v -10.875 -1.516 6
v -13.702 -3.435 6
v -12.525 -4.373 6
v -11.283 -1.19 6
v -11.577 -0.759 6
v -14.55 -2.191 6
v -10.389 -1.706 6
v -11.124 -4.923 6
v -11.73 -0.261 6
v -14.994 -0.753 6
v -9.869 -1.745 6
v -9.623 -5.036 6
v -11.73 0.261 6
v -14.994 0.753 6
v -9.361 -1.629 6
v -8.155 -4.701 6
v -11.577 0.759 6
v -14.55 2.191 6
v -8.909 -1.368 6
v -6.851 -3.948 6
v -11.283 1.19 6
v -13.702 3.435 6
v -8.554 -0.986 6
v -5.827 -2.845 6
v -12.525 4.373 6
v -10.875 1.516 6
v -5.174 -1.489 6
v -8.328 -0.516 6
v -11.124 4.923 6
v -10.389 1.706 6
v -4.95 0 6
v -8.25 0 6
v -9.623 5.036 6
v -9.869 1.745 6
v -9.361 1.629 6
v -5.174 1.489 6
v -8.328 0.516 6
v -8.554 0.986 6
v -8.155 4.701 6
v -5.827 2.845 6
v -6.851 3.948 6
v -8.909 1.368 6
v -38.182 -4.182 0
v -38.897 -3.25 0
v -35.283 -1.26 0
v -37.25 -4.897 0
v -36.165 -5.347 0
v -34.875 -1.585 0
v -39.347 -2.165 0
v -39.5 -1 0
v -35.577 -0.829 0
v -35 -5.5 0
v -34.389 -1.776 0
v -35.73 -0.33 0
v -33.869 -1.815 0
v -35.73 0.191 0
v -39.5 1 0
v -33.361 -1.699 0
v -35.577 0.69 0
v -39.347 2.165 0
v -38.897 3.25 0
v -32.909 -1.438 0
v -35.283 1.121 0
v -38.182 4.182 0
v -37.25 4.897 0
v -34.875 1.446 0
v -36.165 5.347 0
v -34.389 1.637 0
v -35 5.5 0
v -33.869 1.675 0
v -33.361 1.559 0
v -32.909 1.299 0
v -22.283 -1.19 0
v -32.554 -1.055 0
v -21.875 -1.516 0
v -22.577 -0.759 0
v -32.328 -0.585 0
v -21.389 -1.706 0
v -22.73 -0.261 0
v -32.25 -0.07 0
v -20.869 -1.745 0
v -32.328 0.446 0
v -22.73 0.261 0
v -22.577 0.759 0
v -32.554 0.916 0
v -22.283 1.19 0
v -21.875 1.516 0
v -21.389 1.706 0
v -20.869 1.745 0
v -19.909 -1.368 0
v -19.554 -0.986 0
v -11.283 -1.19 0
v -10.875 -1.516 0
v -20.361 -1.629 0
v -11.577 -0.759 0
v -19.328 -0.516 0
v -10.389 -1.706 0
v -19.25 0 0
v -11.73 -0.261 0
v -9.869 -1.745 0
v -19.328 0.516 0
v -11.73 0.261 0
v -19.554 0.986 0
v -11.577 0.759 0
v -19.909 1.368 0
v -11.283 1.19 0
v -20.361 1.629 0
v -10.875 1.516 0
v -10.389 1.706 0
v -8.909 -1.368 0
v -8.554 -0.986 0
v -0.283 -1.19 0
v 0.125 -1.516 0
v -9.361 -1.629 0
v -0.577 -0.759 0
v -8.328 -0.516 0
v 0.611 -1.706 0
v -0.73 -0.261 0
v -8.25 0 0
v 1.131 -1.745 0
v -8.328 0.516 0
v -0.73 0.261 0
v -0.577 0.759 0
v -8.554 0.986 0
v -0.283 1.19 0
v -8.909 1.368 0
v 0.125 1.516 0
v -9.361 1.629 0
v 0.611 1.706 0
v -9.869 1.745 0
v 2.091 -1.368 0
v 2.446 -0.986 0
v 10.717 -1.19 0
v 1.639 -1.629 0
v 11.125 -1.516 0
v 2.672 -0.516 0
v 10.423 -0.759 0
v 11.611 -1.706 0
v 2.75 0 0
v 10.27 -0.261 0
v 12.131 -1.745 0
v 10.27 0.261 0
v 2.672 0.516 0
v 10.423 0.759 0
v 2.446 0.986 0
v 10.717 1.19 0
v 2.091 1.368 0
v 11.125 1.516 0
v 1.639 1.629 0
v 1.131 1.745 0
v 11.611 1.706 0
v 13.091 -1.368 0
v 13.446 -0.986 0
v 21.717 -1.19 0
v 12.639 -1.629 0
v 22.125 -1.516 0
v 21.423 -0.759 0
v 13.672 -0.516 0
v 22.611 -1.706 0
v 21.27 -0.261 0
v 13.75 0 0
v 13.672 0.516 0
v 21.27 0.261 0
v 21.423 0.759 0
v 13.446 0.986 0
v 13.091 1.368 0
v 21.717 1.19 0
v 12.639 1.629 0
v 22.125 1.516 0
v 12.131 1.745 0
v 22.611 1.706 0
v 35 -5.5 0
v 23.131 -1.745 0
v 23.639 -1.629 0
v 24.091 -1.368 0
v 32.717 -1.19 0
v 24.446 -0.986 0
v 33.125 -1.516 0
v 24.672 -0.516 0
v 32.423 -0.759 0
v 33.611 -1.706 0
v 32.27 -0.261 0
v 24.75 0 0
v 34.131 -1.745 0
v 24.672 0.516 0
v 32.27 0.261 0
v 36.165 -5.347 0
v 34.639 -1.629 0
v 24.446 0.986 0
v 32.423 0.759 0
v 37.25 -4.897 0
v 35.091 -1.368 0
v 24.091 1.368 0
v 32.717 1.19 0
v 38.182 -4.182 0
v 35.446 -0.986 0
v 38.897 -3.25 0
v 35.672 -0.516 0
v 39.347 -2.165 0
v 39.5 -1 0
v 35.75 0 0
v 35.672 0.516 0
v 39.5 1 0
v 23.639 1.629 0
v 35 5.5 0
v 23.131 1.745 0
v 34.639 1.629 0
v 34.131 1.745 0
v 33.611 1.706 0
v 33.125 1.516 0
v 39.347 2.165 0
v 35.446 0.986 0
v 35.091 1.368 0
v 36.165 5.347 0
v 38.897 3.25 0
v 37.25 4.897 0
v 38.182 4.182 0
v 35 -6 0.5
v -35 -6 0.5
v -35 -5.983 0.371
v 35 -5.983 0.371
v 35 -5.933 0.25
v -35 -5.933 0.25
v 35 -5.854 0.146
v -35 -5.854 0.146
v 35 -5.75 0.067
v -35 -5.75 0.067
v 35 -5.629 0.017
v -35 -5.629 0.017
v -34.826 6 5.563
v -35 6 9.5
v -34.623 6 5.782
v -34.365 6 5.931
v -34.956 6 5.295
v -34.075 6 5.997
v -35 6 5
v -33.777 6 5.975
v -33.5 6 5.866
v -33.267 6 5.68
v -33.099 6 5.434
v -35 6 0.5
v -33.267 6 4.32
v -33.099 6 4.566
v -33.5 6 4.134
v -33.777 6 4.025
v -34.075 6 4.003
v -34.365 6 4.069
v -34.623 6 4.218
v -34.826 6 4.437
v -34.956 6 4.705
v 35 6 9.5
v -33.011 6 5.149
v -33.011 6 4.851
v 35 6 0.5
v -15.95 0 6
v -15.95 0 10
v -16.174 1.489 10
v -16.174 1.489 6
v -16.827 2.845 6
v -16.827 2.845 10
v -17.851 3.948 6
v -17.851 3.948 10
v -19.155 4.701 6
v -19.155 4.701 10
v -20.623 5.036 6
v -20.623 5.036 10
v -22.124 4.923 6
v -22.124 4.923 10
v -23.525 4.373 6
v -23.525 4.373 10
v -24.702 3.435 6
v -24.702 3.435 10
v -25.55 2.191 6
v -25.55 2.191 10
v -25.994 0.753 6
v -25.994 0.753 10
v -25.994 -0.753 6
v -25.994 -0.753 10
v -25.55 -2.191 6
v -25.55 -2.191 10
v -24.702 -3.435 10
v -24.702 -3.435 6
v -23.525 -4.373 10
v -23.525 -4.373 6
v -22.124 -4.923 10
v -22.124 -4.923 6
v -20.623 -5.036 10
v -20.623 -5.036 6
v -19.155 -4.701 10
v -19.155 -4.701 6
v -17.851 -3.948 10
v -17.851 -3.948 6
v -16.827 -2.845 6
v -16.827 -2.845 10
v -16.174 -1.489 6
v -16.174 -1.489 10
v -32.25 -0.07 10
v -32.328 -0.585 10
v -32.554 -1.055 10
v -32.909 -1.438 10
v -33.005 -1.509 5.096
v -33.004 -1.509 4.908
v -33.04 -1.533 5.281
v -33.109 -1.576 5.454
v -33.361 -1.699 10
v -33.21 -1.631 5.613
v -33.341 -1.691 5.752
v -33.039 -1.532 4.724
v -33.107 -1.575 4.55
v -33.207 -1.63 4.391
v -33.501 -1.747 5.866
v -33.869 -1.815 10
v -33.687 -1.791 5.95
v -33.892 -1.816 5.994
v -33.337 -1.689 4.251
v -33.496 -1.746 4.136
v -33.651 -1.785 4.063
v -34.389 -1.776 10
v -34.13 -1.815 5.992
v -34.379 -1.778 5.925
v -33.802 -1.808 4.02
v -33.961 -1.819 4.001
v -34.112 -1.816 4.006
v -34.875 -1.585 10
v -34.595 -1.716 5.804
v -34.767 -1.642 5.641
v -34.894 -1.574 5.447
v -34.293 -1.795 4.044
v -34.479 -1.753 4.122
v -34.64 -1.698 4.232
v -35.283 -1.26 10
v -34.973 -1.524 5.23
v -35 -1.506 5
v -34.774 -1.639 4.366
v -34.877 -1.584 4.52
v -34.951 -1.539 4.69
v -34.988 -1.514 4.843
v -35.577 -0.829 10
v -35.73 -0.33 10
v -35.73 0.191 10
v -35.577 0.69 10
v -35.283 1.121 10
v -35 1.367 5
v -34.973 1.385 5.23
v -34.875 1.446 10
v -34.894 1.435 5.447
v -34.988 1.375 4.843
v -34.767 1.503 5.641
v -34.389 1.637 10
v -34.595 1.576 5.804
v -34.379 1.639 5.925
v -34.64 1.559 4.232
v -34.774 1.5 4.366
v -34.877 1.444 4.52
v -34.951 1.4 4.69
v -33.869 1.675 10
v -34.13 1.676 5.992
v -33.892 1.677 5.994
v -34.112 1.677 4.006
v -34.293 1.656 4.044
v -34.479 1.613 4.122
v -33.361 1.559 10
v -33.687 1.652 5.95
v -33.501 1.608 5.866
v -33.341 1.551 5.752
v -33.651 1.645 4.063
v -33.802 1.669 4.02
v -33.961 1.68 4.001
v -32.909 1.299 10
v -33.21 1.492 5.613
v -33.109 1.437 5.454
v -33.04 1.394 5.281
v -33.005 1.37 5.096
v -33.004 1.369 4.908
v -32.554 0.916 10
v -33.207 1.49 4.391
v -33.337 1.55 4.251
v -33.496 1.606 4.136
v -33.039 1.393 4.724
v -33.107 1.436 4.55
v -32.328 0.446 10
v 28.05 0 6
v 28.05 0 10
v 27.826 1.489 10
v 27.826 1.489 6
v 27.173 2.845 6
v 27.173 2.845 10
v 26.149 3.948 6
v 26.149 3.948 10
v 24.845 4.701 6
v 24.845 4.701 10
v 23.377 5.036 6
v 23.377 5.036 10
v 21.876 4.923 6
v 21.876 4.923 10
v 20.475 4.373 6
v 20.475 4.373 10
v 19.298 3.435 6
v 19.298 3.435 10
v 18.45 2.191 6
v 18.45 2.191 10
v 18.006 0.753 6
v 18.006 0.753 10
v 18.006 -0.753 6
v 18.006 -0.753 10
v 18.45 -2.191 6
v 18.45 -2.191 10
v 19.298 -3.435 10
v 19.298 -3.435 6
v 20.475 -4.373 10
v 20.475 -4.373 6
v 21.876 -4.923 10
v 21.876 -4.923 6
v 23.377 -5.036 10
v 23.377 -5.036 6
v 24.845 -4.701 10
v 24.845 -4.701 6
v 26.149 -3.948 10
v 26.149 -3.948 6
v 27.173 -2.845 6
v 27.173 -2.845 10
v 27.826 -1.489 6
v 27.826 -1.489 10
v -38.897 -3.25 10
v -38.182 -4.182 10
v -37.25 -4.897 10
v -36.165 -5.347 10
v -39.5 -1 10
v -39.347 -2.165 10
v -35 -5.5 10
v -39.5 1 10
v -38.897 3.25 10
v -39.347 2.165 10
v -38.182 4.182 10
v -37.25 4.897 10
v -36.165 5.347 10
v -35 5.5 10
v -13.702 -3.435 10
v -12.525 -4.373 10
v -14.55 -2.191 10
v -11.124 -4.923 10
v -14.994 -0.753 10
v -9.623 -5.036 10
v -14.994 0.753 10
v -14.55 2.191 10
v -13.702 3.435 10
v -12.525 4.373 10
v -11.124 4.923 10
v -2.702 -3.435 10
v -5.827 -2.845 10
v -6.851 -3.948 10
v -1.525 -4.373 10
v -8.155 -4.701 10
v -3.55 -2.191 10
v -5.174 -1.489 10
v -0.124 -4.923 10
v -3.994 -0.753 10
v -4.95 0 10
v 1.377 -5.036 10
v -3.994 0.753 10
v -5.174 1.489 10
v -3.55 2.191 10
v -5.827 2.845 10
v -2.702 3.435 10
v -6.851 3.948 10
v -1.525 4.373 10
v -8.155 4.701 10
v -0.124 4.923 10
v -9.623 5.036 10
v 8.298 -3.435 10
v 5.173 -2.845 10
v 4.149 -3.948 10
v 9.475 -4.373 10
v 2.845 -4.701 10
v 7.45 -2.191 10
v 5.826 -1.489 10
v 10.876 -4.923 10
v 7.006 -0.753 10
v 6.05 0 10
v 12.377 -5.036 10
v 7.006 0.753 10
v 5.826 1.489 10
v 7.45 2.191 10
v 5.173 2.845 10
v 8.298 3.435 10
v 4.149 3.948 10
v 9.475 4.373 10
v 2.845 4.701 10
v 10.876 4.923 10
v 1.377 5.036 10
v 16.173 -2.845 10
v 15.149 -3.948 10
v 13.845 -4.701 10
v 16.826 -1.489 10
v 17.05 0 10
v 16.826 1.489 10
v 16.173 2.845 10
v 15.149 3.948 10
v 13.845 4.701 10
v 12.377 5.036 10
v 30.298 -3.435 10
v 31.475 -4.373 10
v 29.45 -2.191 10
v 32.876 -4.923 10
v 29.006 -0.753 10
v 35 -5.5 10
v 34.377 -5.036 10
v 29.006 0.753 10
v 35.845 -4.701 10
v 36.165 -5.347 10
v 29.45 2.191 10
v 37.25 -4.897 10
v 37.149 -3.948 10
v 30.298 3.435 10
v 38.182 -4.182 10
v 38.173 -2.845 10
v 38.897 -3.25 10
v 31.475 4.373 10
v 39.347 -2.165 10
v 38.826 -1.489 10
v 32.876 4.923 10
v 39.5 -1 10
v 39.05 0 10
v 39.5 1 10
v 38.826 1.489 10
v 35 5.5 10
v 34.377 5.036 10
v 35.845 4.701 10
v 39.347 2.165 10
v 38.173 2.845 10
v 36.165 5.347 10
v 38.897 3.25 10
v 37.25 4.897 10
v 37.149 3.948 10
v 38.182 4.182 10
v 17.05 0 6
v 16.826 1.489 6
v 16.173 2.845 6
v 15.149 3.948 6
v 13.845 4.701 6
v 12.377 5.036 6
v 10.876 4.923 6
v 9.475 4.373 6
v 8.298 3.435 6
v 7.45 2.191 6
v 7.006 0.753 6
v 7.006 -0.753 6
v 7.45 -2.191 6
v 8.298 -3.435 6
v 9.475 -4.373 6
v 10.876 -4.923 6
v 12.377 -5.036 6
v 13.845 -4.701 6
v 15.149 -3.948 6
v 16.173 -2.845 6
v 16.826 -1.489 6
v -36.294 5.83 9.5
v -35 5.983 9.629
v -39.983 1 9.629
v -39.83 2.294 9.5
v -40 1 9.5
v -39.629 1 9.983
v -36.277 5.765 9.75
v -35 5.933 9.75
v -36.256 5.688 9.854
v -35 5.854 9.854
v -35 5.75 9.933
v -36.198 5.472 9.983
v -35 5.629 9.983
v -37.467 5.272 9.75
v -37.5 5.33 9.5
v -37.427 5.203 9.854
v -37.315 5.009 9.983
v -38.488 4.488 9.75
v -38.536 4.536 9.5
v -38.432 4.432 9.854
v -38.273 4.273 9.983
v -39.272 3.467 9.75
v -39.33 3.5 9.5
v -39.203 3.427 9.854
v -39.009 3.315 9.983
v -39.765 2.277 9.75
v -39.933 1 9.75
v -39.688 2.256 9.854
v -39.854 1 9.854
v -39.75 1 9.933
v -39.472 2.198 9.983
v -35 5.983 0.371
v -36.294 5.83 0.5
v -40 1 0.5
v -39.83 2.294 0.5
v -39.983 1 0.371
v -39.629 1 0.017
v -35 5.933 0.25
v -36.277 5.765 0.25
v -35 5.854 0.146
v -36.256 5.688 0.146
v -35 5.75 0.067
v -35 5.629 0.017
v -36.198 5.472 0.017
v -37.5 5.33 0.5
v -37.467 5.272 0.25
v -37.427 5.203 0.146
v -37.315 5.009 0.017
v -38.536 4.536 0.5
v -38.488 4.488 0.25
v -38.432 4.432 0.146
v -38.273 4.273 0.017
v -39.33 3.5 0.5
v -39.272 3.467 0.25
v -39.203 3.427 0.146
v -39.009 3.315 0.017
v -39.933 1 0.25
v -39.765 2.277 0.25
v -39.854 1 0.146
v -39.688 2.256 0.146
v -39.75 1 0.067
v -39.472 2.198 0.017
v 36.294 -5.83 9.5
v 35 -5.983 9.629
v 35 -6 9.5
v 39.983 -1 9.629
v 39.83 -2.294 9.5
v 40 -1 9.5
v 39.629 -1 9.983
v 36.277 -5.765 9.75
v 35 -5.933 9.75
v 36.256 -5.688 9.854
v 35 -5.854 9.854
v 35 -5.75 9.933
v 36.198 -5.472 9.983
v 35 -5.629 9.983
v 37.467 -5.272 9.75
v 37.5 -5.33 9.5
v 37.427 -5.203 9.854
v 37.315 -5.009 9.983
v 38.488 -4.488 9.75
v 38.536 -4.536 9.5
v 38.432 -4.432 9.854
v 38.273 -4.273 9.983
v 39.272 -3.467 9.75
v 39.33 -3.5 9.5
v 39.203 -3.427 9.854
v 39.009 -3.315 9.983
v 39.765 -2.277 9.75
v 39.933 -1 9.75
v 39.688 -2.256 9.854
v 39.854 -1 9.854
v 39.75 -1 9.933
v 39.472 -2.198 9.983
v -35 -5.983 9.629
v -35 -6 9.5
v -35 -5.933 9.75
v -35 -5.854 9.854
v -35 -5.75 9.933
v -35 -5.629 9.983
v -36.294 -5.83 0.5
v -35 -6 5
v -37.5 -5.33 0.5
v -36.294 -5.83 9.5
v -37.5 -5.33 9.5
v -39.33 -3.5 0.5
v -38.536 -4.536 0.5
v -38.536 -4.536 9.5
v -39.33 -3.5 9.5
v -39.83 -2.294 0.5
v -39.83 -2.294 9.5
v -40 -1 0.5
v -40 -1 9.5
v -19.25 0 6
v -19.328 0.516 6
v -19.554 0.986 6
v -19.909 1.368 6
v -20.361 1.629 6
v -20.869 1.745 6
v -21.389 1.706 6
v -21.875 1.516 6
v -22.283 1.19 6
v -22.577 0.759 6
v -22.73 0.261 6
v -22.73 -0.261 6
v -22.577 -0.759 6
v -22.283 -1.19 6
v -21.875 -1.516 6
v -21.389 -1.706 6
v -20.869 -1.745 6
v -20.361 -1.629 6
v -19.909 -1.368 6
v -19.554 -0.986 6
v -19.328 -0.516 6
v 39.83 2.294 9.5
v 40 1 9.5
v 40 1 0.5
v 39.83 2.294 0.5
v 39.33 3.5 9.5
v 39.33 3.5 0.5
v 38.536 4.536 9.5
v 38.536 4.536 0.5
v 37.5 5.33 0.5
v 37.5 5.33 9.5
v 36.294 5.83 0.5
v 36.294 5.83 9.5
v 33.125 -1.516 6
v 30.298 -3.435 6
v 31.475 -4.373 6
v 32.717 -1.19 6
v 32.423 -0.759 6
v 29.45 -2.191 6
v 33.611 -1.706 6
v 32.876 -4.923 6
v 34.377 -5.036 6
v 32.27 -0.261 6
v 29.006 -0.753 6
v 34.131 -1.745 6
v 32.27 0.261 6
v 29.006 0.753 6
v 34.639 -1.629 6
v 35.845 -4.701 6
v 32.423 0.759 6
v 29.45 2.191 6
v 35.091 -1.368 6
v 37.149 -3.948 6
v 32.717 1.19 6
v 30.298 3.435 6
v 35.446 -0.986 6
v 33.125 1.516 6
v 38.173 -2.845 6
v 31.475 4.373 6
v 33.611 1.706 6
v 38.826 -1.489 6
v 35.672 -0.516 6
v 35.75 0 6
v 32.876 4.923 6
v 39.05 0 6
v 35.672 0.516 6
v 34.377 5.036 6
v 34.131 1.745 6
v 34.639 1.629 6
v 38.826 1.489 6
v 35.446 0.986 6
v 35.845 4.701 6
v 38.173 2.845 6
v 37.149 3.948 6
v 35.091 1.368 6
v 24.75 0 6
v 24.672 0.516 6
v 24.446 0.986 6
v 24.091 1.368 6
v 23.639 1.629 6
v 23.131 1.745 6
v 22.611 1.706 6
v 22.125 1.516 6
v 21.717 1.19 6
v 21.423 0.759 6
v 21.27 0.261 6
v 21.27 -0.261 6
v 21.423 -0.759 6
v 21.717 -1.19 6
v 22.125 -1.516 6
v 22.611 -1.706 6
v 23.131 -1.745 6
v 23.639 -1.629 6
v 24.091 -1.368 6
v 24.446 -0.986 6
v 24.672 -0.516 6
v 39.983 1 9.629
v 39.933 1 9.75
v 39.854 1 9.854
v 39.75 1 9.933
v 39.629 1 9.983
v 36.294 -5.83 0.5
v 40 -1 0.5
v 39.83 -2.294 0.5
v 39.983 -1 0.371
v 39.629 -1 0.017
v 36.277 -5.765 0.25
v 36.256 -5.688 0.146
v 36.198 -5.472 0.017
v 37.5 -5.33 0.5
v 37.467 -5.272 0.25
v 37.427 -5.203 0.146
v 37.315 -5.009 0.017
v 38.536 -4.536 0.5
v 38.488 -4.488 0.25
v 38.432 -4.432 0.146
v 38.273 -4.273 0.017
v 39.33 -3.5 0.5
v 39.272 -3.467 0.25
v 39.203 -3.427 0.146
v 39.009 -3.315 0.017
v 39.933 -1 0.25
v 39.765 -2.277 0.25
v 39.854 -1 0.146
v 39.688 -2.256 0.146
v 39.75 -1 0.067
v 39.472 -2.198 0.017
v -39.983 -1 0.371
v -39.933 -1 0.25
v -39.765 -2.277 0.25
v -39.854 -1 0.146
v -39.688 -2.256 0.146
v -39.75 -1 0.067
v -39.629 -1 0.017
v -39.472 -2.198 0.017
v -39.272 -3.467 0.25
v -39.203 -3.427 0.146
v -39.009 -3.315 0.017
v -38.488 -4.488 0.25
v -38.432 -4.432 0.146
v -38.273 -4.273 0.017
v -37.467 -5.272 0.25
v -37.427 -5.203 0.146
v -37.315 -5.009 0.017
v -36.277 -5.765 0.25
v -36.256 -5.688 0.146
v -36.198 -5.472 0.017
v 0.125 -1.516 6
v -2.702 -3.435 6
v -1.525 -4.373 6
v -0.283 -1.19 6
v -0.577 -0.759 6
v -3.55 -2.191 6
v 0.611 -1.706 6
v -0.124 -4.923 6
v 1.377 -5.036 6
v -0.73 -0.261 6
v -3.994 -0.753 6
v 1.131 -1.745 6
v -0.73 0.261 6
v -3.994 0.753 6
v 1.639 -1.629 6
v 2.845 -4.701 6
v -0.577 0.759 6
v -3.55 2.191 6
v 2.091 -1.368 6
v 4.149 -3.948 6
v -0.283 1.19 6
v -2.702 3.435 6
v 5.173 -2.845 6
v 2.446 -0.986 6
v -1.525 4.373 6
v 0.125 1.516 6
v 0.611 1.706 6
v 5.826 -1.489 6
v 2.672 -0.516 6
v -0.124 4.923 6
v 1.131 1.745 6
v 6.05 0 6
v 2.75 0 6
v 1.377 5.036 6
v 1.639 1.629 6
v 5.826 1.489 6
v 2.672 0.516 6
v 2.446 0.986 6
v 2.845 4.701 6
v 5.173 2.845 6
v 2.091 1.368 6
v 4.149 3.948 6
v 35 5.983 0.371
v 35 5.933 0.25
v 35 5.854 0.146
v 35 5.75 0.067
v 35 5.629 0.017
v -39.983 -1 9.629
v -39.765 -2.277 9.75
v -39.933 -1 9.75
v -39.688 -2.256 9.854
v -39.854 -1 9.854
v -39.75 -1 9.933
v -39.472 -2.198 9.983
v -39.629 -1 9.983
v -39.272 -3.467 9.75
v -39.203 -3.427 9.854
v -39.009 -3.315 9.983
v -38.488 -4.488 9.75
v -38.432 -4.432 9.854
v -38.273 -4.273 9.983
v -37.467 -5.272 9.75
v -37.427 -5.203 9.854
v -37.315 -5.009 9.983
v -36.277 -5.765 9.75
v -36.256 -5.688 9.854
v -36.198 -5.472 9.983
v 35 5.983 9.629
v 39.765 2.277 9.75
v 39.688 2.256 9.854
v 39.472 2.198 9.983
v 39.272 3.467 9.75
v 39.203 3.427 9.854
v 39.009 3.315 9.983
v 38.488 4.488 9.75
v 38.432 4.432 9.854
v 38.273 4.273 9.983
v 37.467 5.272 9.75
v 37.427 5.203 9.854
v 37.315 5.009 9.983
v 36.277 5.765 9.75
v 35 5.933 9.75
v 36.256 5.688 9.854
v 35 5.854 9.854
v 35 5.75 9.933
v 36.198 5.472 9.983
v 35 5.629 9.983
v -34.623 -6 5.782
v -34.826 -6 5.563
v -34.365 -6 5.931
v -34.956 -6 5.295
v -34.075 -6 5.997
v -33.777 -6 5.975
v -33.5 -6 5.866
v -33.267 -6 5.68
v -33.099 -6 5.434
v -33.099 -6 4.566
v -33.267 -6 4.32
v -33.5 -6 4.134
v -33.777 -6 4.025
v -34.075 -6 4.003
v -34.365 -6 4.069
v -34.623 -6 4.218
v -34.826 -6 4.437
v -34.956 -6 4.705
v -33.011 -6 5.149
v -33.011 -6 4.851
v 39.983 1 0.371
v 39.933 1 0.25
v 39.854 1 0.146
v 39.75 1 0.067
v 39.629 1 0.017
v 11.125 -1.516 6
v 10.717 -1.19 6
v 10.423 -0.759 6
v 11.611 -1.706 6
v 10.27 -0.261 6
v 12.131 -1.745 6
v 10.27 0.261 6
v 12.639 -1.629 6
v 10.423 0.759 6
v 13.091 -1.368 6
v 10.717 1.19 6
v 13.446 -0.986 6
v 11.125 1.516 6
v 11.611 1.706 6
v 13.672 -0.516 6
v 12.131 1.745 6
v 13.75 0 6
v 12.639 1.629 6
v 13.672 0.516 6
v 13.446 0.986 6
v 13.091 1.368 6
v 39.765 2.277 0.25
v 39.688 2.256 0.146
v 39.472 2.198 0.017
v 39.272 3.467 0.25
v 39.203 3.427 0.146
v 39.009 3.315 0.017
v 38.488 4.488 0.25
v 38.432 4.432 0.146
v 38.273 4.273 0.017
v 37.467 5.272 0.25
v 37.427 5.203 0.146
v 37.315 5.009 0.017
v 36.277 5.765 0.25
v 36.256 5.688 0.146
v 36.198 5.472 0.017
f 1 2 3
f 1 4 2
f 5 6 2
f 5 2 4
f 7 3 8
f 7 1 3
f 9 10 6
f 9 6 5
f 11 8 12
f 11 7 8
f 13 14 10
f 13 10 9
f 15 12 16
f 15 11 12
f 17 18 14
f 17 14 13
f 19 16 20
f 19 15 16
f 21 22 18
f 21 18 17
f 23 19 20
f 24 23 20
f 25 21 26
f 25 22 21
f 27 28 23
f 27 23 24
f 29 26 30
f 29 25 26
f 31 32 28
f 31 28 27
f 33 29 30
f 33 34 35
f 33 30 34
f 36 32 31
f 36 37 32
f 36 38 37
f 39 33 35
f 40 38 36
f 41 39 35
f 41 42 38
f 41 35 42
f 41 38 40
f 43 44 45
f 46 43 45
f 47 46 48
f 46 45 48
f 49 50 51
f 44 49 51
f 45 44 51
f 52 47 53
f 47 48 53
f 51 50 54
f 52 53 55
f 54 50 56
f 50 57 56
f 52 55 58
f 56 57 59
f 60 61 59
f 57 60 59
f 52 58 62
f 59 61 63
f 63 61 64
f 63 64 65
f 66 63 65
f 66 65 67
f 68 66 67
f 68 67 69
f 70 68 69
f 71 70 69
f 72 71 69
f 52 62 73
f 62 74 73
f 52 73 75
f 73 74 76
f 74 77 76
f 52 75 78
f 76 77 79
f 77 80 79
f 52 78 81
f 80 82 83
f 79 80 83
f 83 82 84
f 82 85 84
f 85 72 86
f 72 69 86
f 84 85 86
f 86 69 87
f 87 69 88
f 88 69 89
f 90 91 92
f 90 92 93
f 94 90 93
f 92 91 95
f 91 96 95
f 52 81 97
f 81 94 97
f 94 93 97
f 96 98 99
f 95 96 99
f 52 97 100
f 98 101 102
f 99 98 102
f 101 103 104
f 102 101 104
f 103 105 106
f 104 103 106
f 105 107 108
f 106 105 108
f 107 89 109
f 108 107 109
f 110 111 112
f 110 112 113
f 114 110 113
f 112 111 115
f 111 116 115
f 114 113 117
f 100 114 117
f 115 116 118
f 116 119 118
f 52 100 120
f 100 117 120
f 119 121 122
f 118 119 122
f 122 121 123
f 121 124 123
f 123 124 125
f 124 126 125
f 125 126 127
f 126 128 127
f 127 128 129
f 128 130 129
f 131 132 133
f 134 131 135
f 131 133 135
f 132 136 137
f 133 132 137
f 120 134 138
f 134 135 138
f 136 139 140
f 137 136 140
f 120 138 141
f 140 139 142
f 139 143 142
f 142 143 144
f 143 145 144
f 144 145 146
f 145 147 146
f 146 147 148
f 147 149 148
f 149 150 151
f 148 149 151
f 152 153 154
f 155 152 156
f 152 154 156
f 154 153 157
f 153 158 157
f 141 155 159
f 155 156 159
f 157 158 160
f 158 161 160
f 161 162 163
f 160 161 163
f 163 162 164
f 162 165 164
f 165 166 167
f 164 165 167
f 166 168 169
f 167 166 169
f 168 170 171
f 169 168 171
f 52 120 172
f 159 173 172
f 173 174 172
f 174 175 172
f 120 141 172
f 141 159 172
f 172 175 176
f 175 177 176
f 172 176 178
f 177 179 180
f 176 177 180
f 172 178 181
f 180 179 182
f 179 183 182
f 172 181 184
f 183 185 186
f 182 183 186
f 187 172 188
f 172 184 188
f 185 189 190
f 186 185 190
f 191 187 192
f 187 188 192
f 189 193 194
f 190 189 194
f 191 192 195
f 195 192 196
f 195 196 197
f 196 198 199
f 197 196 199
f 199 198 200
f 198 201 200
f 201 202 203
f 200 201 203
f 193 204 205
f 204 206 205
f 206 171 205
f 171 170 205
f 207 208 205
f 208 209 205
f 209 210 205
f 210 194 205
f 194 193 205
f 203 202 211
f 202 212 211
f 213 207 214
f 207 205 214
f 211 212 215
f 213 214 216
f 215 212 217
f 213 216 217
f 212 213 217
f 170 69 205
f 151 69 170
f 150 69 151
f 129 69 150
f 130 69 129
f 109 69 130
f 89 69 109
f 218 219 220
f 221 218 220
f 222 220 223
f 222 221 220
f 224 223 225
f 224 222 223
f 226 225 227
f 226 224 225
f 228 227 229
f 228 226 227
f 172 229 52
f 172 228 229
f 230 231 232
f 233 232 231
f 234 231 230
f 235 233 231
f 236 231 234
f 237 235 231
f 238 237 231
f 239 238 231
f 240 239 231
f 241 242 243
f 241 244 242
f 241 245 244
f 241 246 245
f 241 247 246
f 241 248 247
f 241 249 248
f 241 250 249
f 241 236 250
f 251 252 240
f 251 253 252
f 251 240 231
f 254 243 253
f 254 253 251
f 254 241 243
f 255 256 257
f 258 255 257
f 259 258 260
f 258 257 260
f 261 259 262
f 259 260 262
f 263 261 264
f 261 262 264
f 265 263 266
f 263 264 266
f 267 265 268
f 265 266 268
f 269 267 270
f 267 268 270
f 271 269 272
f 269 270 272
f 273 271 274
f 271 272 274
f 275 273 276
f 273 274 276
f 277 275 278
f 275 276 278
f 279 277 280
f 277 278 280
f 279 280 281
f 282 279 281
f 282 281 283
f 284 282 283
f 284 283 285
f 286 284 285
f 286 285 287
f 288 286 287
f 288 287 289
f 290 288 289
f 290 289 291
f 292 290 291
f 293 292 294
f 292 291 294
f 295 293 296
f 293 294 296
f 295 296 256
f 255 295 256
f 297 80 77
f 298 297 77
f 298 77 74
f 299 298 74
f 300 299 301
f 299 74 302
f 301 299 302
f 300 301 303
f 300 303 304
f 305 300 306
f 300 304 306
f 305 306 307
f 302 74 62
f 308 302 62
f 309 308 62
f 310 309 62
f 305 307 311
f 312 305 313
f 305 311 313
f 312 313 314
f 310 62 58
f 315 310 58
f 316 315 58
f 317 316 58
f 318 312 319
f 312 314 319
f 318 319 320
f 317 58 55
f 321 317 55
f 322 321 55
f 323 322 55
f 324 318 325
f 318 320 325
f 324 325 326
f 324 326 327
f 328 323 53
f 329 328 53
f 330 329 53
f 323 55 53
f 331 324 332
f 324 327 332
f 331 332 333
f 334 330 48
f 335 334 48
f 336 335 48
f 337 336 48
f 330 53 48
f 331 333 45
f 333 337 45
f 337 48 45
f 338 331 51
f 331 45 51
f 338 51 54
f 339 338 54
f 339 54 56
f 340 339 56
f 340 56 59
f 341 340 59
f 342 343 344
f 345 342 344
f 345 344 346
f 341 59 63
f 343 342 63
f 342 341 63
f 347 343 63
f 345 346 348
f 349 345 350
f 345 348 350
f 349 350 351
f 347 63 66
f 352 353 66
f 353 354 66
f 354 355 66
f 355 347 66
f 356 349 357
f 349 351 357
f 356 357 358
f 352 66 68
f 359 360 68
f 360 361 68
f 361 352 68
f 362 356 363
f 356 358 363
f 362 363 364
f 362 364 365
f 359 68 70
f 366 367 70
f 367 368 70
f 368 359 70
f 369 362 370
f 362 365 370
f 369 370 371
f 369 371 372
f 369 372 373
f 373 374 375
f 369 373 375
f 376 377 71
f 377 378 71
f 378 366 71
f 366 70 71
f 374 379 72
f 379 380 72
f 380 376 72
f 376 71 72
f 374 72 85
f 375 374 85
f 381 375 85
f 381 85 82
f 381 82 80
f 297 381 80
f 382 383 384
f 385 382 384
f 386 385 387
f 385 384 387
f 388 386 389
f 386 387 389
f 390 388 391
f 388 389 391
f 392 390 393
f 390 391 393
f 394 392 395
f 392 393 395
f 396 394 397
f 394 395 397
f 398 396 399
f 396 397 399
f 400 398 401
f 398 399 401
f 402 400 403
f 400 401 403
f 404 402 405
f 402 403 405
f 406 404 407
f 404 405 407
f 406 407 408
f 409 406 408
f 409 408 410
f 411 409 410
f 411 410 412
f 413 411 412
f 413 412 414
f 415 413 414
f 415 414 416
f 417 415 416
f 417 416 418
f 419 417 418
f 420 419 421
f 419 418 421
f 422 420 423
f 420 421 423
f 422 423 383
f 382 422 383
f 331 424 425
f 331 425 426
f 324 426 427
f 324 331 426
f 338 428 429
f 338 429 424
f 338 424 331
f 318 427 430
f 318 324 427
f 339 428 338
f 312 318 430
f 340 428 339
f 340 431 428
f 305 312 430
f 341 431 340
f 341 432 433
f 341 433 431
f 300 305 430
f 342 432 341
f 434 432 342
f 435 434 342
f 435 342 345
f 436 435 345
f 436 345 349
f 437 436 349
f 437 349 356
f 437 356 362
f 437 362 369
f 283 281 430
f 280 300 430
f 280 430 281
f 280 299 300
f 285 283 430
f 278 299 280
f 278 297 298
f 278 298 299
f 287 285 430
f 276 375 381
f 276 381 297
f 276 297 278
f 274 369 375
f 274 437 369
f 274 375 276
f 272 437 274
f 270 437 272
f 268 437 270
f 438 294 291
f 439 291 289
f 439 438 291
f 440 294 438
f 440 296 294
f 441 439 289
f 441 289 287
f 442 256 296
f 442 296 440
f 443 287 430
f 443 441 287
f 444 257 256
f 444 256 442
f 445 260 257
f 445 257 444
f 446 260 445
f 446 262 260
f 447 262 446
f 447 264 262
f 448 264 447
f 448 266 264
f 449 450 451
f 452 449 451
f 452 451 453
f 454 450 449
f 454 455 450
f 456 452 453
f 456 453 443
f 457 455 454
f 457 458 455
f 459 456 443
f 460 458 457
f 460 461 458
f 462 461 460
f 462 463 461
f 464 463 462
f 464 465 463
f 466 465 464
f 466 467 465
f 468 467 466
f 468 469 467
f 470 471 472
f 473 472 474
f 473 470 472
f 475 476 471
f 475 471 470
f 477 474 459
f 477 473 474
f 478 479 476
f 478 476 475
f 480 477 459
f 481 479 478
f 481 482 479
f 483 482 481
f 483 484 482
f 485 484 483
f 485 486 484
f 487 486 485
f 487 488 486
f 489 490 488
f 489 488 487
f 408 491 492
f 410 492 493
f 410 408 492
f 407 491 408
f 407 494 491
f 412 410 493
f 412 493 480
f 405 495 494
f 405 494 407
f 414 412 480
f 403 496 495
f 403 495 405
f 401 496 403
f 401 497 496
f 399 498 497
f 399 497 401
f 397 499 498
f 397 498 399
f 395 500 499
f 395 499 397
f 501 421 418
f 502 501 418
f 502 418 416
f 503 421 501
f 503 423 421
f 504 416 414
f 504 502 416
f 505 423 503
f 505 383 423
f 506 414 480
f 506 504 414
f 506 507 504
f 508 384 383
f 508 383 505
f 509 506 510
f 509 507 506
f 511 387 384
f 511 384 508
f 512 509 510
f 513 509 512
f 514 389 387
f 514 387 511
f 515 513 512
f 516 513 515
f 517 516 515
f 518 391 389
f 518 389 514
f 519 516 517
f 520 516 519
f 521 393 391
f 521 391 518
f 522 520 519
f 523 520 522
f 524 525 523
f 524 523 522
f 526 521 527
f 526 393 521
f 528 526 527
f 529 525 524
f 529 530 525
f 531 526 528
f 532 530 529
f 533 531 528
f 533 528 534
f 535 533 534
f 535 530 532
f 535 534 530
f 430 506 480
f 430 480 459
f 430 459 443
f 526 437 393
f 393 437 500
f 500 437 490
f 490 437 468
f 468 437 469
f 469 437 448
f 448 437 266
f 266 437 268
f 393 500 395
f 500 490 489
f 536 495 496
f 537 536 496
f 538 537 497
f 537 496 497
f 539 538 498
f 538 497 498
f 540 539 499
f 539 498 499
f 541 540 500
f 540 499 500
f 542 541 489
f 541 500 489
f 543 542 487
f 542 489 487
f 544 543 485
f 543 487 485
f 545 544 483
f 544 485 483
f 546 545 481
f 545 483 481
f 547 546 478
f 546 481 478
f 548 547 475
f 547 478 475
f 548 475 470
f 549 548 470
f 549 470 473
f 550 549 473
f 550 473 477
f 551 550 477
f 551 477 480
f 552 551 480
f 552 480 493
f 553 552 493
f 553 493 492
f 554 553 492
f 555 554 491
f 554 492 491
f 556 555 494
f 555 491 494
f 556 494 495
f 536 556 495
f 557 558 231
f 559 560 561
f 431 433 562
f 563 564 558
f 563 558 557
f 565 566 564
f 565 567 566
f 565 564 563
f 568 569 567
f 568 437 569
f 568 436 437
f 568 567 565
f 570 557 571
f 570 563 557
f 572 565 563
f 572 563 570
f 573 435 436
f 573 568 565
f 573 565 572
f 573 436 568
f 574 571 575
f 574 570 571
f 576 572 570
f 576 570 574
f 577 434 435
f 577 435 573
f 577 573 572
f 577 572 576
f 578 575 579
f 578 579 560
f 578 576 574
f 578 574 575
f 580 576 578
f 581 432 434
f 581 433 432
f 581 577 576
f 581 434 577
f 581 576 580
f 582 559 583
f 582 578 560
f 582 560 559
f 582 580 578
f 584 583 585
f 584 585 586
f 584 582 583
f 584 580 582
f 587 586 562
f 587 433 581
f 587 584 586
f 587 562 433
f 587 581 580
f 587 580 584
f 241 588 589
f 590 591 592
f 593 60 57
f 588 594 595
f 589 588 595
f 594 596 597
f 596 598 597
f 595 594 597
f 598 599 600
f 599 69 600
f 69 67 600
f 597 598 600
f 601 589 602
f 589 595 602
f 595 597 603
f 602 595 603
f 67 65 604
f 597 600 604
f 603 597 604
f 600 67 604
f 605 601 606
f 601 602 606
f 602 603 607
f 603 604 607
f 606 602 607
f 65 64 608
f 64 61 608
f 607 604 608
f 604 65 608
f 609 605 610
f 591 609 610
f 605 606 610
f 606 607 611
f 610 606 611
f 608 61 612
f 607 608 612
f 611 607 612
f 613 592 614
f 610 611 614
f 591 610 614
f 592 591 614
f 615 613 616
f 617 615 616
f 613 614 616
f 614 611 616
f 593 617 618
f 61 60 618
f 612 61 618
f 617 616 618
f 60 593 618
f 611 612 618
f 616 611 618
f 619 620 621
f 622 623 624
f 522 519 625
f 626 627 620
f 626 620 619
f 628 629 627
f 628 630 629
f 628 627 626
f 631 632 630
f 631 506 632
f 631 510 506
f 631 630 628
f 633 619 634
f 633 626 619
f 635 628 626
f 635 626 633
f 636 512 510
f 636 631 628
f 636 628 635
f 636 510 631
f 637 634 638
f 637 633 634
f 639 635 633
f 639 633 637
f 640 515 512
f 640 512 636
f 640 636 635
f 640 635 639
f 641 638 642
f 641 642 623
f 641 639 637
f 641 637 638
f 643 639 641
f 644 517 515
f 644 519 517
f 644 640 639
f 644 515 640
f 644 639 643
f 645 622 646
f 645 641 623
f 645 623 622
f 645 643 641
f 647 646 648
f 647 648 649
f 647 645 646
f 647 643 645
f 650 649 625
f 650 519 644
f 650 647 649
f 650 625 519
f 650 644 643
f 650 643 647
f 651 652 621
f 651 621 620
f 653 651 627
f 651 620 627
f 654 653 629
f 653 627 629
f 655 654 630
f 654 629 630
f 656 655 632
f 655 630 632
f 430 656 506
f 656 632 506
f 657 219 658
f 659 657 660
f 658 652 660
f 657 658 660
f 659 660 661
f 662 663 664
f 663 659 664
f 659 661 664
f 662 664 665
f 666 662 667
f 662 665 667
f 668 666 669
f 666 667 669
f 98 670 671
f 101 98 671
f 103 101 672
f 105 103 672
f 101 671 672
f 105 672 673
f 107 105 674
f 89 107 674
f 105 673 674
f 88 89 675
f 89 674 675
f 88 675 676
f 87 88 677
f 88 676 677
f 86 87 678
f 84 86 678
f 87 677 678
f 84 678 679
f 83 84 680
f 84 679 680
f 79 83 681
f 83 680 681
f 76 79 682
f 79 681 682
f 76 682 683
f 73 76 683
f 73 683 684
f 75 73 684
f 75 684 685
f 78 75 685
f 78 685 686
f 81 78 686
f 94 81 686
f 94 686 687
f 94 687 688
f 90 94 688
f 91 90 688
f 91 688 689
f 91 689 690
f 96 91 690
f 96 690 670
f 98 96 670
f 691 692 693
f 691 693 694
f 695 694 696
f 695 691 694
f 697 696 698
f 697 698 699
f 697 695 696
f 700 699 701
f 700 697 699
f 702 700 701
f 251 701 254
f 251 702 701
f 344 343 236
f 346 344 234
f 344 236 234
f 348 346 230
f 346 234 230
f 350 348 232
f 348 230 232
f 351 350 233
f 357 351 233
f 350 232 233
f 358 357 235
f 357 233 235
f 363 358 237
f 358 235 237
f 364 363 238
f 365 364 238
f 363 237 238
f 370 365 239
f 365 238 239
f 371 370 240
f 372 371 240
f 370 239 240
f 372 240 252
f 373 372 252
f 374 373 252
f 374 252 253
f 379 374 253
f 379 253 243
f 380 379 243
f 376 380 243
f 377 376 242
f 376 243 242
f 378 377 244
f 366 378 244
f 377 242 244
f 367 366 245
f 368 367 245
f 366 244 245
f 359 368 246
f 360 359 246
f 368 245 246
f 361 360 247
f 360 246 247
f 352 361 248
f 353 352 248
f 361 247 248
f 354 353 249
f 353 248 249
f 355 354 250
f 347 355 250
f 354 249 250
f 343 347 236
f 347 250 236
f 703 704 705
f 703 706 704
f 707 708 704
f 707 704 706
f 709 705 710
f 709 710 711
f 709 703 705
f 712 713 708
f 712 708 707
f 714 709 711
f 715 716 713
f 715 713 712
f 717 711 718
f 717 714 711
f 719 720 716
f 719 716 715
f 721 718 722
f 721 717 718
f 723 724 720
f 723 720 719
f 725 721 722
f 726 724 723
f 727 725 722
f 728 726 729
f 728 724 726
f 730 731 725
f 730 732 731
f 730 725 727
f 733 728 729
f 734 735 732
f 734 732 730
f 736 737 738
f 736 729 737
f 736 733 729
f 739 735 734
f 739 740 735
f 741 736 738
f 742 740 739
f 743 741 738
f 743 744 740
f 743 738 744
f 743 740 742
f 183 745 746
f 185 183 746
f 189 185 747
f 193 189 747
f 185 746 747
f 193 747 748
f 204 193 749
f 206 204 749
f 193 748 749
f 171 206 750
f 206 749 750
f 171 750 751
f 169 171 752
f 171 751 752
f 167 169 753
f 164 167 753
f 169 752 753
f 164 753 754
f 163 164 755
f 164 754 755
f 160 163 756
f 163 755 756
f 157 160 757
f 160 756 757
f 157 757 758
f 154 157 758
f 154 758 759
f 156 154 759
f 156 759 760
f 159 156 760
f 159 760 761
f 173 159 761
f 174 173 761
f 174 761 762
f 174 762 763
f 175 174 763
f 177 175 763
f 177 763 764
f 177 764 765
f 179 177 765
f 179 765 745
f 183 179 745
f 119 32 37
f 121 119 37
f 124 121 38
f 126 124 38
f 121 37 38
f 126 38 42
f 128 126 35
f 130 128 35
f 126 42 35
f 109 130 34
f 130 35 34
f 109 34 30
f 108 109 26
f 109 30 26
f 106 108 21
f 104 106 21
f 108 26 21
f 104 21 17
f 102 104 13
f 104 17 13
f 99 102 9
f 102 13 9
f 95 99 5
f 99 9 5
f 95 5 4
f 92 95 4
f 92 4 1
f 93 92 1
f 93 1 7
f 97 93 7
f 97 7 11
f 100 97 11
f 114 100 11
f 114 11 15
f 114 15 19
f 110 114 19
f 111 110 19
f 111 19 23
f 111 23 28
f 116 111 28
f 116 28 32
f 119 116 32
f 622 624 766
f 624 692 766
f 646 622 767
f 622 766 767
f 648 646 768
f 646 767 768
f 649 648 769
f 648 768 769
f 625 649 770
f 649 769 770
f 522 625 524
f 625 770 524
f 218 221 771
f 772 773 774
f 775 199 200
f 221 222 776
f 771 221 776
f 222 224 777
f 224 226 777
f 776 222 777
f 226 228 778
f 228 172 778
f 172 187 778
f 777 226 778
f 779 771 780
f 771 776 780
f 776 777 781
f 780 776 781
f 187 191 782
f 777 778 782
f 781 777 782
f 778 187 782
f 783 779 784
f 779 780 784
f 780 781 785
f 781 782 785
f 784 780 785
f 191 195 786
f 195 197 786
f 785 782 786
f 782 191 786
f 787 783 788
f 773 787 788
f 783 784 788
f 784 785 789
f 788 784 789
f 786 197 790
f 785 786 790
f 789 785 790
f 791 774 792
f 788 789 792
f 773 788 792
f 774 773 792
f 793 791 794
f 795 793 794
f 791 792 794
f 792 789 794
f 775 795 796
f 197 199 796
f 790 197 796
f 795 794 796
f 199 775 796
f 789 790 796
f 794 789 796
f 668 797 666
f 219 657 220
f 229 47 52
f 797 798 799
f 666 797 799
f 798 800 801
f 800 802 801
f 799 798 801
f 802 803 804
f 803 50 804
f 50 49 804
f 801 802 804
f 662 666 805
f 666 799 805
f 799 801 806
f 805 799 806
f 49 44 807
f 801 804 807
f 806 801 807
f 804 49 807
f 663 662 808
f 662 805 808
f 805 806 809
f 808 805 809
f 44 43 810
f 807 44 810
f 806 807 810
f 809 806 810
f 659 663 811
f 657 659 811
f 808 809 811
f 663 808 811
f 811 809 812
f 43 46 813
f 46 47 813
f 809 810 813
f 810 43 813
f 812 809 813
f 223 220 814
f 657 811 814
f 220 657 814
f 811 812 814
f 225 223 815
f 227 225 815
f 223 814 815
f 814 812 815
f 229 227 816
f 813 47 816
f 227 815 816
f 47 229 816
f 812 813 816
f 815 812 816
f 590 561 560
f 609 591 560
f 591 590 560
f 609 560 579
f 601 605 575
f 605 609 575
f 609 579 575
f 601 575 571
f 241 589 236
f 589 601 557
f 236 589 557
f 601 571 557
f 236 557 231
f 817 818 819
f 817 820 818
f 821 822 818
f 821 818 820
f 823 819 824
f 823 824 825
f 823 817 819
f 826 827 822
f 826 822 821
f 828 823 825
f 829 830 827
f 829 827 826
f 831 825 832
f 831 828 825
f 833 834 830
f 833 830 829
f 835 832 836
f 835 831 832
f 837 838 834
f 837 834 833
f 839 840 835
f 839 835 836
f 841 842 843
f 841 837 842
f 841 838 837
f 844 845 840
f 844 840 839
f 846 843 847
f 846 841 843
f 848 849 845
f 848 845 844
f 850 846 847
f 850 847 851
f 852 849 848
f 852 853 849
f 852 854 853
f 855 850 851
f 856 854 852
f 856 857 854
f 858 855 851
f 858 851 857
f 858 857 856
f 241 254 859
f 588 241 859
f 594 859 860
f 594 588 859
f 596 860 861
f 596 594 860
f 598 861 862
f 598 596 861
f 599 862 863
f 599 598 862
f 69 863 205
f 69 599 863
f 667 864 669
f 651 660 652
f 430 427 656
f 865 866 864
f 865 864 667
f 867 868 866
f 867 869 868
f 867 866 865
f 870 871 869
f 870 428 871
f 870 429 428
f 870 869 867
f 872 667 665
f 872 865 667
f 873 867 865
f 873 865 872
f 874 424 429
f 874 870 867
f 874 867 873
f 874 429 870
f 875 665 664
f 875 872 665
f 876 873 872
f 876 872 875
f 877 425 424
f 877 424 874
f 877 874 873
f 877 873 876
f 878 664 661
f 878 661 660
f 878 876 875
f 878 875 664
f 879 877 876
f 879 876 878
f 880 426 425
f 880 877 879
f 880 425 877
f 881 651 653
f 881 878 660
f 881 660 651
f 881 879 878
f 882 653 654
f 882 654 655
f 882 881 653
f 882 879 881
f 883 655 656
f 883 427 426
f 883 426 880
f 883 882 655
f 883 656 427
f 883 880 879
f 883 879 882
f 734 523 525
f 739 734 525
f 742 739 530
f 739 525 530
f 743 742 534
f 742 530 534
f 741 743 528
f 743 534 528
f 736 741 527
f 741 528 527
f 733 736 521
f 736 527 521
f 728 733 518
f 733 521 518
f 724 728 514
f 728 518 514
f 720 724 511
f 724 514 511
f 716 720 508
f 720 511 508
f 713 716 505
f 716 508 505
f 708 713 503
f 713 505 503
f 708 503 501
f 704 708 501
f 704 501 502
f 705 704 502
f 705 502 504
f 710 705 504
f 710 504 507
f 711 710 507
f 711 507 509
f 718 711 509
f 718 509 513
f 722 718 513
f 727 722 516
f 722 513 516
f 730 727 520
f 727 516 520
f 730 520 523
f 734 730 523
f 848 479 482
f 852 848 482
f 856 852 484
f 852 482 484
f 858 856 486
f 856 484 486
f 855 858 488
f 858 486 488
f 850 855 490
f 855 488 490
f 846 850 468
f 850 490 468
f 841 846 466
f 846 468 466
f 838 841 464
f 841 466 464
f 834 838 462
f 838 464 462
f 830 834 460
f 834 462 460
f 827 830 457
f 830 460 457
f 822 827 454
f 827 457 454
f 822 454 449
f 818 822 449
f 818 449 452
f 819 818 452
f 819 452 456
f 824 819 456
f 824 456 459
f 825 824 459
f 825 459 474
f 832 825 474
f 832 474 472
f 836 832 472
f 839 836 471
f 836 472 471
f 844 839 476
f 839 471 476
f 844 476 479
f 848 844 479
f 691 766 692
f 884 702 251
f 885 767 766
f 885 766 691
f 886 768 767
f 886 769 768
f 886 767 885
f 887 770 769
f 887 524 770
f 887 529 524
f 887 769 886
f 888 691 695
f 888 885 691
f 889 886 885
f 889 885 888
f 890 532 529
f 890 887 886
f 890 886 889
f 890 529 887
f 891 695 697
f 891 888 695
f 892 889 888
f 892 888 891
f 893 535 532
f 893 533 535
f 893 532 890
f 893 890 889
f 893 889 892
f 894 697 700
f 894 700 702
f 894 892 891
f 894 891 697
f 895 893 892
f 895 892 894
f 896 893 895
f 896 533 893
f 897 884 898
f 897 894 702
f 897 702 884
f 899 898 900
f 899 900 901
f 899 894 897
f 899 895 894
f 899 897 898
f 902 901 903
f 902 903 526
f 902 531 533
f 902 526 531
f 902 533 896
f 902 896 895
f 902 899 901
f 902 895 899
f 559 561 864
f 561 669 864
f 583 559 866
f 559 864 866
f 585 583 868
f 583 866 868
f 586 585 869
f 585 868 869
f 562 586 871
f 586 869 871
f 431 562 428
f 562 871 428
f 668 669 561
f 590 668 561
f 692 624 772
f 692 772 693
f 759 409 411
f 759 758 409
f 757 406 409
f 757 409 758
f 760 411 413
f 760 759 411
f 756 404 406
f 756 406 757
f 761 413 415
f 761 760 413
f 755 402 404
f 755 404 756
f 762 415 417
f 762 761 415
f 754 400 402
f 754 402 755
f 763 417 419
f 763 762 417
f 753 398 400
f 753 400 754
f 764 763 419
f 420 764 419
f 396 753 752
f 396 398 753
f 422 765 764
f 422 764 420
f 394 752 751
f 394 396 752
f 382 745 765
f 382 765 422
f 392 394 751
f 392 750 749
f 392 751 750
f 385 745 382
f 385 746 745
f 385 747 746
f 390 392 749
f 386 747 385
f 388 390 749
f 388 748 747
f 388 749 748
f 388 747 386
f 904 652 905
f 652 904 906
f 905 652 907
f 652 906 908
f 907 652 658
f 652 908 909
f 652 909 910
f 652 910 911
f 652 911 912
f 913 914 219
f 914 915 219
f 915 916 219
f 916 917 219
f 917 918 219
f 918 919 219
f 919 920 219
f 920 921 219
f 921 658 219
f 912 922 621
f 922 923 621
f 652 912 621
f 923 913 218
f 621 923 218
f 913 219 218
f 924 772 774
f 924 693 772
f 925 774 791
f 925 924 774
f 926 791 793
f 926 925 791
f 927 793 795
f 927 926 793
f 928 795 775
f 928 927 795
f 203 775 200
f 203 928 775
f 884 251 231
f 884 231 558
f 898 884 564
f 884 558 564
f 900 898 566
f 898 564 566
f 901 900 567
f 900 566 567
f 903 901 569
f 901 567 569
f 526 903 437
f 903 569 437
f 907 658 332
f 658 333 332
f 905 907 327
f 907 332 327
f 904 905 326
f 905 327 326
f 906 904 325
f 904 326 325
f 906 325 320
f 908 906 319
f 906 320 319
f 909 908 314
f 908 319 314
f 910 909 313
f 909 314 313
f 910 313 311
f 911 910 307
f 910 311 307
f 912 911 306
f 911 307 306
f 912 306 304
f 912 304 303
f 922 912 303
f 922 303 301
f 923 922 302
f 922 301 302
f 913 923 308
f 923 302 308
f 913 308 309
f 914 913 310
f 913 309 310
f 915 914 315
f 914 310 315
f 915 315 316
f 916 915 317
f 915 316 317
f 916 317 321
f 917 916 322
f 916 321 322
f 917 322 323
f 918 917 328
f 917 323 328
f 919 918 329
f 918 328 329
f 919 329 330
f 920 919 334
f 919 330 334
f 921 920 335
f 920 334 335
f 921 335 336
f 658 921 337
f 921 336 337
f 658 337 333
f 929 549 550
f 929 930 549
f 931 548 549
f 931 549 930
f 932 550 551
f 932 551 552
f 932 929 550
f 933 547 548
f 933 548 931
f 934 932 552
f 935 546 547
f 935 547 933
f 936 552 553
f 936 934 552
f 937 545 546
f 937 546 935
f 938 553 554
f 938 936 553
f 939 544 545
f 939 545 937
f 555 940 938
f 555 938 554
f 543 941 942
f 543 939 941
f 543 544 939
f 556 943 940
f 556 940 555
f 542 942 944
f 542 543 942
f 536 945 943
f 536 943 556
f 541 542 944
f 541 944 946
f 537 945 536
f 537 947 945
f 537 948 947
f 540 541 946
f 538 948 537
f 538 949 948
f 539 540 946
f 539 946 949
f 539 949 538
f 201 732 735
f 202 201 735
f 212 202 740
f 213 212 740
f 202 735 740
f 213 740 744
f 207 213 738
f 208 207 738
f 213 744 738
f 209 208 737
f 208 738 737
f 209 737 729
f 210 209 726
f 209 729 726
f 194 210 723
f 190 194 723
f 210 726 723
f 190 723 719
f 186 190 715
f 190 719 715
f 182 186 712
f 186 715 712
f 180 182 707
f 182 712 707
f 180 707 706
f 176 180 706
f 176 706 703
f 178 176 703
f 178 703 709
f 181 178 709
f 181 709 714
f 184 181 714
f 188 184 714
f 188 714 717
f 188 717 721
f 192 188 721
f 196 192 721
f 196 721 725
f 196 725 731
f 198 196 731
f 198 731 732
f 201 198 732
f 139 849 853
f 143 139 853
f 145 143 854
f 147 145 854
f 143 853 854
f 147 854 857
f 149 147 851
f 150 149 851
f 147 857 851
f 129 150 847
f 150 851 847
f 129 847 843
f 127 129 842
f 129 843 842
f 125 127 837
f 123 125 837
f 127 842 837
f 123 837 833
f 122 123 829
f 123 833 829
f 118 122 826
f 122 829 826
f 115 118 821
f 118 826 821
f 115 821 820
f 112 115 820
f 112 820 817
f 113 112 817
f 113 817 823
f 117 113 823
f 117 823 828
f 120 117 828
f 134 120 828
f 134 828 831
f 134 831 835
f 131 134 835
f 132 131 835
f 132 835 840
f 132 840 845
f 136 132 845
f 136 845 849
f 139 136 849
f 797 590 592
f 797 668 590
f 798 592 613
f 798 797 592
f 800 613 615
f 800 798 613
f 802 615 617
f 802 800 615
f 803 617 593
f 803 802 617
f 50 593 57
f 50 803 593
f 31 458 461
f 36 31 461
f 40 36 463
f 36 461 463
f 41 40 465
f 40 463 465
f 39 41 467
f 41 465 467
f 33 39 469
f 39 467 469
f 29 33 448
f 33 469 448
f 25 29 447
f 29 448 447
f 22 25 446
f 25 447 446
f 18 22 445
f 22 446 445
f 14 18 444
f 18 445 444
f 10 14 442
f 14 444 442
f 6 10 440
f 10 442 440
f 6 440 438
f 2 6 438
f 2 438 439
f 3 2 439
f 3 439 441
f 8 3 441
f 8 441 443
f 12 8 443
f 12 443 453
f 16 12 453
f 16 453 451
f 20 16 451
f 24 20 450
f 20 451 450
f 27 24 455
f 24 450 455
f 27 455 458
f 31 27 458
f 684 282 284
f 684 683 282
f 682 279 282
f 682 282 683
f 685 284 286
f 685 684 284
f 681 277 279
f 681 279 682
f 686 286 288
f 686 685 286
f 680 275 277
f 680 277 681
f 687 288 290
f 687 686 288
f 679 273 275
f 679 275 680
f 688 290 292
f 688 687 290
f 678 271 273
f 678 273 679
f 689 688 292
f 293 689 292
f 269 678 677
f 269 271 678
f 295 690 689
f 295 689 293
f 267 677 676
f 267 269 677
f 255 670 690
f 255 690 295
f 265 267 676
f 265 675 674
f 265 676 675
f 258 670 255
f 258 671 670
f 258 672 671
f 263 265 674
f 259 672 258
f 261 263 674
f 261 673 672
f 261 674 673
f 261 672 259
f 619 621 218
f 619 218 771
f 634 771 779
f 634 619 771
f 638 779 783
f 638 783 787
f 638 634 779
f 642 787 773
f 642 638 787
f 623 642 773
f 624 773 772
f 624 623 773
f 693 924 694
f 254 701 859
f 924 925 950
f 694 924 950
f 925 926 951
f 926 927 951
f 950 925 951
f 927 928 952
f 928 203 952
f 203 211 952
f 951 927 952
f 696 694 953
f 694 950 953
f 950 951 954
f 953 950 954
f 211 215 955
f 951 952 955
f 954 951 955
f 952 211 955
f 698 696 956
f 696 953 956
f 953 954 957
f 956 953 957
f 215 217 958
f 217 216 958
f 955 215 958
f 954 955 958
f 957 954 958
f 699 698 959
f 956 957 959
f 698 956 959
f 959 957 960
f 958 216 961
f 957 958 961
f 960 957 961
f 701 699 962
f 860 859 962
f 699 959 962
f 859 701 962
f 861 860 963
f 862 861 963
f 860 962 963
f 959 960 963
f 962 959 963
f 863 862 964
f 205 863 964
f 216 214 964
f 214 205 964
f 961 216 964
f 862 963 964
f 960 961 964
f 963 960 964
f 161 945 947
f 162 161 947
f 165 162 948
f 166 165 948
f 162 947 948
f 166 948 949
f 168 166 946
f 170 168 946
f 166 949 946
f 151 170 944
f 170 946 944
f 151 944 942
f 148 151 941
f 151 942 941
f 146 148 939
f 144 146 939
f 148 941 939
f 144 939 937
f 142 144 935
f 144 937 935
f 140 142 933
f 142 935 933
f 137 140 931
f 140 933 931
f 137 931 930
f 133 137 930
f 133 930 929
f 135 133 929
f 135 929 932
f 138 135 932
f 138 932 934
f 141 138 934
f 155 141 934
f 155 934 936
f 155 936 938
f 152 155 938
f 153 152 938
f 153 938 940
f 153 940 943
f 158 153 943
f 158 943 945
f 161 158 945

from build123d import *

# Parameters (mm, degrees)
F0_W      = 80
F0_H      = 12
F1_DEPTH  = 10
F2_R      = 5.05
F3_DEPTH  = 4
F4_R      = 5
F5_R      = 5
F6_R      = 1.75
F7_DEPTH  = 25
F8_R      = 0.5
F9_R      = 0.5
F10_R     = 1.75
F11_DEPTH = 25
F12_R     = 1
F13_DEPTH = 25


with BuildPart() as f1:
    # F0 (on Top) → F1 (new body)
    with BuildSketch(Plane.XY):
        Rectangle(F0_W, F0_H)
    extrude(amount=F1_DEPTH)

    # F2 (on face) → F3 (cut)
    with BuildSketch(Plane.XY.offset(10)):
        with Locations((34, 0)):
            Circle(F2_R)
        with Locations((23, 0)):
            Circle(F2_R)
        with Locations((12, 0)):
            Circle(F2_R)
        with Locations((1, 0)):
            Circle(F2_R)
        with Locations((-10, 0)):
            Circle(F2_R)
        with Locations((-21, 0)):
            Circle(F2_R)
    extrude(amount=-F3_DEPTH, mode=Mode.SUBTRACT)

    # F4
    f4_edges = [f1.edges().sort_by_distance(p)[0] for p in [
        (40, -6, 5),
    ]]
    fillet(f4_edges, radius=F4_R)

    # F5
    f5_edges = [f1.edges().sort_by_distance(p)[0] for p in [
        (40, 6, 5),
        (-40, -6, 5),
        (-40, 6, 5),
    ]]
    fillet(f5_edges, radius=F5_R)

    # F6 (on face) → F7 (cut)
    with BuildSketch(Plane.XY.offset(6)):
        with Locations((34, 0)):
            Circle(F6_R)
        with Locations((23, 0)):
            Circle(F6_R)
        with Locations((12, 0)):
            Circle(F6_R)
        with Locations((1, 0)):
            Circle(F6_R)
        with Locations((-10, 0)):
            Circle(F6_R)
        with Locations((-21, 0)):
            Circle(F6_R)
    extrude(amount=-F7_DEPTH, mode=Mode.SUBTRACT)

    # F8
    f8_edges = [f1.edges().sort_by_distance(p)[0] for p in [
        (0, -6, 10),
        (38.535534, -4.535534, 10),
        (38.535534, 4.535534, 10),
        (0, 6, 10),
        (-38.535534, -4.535534, 10),
    ]]
    fillet(f8_edges, radius=F8_R)

    # F9
    f9_edges = [f1.edges().sort_by_distance(p)[0] for p in [
        (0, -6, 0),
        (-38.535534, -4.535534, 0),
        (0, 6, 0),
        (38.535534, 4.535534, 0),
        (38.535534, -4.535534, 0),
    ]]
    fillet(f9_edges, radius=F9_R)

    # F10 (on face) → F11 (cut)
    with BuildSketch(Plane(origin=(0, 0, 0), x_dir=(1, 0, 0), z_dir=(0, 0, -1))):
        with Locations((-34, 0.0696202532)):
            Circle(F10_R)
    extrude(amount=-F11_DEPTH, mode=Mode.SUBTRACT)

    # F12 (on face) → F13 (cut)
    with BuildSketch(Plane(origin=(0, 6, 0), x_dir=(-1, 0, 0), z_dir=(0, 1, 0))):
        with Locations((34, 5)):
            Circle(F12_R)
    extrude(amount=-F13_DEPTH, mode=Mode.SUBTRACT)


solid = f1.part
